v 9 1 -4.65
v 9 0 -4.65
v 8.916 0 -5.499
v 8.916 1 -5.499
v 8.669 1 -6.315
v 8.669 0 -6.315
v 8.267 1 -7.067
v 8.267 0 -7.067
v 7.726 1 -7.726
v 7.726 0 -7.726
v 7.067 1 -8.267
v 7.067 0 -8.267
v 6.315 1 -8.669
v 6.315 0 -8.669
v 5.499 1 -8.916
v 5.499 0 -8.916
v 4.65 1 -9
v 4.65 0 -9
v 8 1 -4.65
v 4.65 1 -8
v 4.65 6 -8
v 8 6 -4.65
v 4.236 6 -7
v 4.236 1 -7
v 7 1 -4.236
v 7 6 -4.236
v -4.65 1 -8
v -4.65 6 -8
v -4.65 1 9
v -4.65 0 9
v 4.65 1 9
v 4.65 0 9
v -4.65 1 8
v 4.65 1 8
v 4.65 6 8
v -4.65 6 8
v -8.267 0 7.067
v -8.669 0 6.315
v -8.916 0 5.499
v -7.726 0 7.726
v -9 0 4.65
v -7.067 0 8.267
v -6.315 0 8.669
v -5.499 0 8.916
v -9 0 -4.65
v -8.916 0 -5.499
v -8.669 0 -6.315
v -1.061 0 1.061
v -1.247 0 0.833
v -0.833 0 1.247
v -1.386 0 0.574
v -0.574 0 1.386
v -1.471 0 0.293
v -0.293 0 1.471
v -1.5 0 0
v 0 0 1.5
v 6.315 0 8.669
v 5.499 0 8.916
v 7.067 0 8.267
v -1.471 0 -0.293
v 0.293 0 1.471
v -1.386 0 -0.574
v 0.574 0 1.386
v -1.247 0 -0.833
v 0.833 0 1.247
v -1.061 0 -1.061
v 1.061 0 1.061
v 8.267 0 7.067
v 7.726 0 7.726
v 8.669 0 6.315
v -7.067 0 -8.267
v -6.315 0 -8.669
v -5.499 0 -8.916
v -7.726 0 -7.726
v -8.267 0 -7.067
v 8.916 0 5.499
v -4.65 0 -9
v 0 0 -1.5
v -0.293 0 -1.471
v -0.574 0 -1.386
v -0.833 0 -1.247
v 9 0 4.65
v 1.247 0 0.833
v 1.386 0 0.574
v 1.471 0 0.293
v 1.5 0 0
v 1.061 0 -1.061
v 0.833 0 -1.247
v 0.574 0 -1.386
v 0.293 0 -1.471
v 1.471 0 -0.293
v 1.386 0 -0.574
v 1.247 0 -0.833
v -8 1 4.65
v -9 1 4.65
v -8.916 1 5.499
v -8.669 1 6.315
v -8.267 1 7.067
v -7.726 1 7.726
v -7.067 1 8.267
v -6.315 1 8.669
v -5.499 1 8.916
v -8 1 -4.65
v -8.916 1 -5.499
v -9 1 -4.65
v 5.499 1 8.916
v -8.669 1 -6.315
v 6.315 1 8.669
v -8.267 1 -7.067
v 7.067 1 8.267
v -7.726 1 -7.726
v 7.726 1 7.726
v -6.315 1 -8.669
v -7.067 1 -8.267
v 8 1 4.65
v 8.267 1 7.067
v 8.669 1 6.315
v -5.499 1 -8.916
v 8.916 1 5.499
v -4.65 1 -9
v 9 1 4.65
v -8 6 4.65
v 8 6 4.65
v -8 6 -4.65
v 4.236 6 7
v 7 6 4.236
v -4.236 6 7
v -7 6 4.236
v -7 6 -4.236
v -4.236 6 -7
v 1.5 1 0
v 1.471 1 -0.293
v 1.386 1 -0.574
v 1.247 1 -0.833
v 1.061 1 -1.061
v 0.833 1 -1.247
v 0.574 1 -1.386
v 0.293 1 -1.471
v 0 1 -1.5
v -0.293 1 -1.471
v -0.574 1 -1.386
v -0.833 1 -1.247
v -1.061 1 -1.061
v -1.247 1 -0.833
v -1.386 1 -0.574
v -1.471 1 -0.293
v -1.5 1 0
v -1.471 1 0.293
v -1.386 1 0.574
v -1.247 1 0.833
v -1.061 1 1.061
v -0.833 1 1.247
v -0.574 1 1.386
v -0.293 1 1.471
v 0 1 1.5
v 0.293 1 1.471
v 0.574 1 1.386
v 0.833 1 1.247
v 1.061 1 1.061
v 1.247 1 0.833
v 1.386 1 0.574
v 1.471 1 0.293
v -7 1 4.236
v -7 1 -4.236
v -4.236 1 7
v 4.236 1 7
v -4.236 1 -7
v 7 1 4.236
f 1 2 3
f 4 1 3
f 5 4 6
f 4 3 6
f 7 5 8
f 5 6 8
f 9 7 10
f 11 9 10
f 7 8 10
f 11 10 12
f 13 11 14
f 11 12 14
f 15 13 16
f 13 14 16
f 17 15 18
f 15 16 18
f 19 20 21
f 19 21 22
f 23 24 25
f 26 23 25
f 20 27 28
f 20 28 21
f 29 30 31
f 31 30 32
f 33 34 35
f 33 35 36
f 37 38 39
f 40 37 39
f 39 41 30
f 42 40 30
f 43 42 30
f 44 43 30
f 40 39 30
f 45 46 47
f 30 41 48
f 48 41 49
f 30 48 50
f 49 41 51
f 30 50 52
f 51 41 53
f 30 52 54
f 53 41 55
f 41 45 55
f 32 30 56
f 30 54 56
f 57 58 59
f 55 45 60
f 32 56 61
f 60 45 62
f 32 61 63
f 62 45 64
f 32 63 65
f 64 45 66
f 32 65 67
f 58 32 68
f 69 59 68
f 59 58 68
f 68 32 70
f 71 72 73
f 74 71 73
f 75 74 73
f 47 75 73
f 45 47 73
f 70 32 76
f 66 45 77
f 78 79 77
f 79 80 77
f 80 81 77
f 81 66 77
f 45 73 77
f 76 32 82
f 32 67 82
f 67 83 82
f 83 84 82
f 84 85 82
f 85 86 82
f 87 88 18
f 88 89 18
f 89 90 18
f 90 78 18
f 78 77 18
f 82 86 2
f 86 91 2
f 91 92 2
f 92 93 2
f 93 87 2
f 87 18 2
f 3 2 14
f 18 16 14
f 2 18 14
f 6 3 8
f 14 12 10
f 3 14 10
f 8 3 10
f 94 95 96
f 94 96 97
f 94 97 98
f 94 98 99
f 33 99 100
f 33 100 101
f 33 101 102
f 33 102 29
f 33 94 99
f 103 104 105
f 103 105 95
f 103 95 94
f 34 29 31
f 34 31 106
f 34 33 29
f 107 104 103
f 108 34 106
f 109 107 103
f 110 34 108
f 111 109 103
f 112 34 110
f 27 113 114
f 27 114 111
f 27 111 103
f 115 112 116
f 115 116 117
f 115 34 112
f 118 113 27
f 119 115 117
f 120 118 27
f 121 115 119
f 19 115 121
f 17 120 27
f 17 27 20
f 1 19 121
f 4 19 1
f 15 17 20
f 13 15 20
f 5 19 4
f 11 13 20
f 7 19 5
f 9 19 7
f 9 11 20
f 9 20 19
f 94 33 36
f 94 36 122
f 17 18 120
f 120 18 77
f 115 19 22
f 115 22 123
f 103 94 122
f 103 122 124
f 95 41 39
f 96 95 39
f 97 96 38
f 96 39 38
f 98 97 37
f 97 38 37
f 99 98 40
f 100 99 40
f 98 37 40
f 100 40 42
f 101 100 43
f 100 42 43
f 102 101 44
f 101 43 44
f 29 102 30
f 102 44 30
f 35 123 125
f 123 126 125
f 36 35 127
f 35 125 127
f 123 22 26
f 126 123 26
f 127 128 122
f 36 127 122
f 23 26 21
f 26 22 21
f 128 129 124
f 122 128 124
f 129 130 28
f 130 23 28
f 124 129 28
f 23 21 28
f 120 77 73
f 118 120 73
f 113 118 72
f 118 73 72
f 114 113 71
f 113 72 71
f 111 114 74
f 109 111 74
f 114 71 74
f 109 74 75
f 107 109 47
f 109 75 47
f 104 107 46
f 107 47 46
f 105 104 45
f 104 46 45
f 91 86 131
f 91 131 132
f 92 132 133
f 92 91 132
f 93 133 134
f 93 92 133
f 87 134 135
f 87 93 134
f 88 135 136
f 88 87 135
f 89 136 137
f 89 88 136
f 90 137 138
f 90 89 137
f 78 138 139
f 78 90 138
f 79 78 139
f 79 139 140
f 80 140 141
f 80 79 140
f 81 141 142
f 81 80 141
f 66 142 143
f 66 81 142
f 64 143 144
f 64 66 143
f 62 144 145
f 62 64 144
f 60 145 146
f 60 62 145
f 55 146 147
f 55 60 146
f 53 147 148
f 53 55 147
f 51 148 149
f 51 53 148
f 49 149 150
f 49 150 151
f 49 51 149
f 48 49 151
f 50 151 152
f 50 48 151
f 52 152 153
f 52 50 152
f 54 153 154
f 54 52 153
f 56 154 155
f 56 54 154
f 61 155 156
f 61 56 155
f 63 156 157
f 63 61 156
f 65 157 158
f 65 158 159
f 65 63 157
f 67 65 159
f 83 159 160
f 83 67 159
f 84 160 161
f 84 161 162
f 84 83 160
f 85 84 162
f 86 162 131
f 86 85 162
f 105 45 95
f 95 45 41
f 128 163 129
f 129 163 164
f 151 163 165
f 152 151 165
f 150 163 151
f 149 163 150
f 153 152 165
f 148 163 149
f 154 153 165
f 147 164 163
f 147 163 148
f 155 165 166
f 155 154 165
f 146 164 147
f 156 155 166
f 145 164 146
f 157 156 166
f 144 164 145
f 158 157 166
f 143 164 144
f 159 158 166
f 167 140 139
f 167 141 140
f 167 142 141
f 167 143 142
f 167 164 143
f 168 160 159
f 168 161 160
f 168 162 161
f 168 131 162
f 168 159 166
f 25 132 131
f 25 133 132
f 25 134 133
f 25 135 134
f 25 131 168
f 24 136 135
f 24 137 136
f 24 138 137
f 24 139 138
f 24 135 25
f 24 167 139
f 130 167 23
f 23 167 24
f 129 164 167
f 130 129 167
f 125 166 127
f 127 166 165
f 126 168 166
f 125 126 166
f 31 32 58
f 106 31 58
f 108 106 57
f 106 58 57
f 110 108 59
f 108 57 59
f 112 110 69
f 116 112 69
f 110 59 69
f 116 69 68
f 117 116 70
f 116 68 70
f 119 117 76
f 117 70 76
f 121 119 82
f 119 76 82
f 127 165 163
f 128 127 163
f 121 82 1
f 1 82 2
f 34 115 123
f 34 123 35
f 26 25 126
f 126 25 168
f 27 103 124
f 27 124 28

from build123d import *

# Parameters (mm, degrees)
SKETCH1_R           = 1.5
BOSS_EXTRUDE1_DEPTH = 1
BOSS_EXTRUDE2_DEPTH = 5


with BuildPart() as part:
    # Sketch1 → Boss-Extrude1 (new body)
    with BuildSketch(Plane(origin=(0, 0, 0), x_dir=(1, 0, 0), z_dir=(0, 1, 0))):
        with BuildLine():
            Line((-4.65, -9), (4.65, -9))
            ThreePointArc((4.65, -9), (7.725914498, -7.725914498), (9, -4.65))
            Line((9, -4.65), (9, 4.65))
            ThreePointArc((9, 4.65), (7.725914498, 7.725914498), (4.65, 9))
            Line((4.65, 9), (-4.65, 9))
            ThreePointArc((-4.65, 9), (-7.725914498, 7.725914498), (-9, 4.65))
            Line((-9, 4.65), (-9, -4.65))
            ThreePointArc((-9, -4.65), (-7.725914498, -7.725914498), (-4.65, -9))
        make_face()
        Circle(SKETCH1_R, mode=Mode.SUBTRACT)
    extrude(amount=BOSS_EXTRUDE1_DEPTH)

    # Sketch2 → Boss-Extrude2 (add)
    with BuildSketch(Plane(origin=(0, 1, 0), x_dir=(1, 0, 0), z_dir=(0, 1, 0))):
        Polygon((-8, 4.65), (-4.65, 8), (4.65, 8), (8, 4.65), (8, -4.65), (4.65, -8), (-4.65, -8), (-8, -4.65), align=None)
        Polygon((-7, 4.235786438), (-4.235786438, 7), (4.235786438, 7), (7, 4.235786438), (7, -4.235786438), (4.235786438, -7), (-4.235786438, -7), (-7, -4.235786438), align=None, mode=Mode.SUBTRACT)
    extrude(amount=BOSS_EXTRUDE2_DEPTH)


solid = part.part
